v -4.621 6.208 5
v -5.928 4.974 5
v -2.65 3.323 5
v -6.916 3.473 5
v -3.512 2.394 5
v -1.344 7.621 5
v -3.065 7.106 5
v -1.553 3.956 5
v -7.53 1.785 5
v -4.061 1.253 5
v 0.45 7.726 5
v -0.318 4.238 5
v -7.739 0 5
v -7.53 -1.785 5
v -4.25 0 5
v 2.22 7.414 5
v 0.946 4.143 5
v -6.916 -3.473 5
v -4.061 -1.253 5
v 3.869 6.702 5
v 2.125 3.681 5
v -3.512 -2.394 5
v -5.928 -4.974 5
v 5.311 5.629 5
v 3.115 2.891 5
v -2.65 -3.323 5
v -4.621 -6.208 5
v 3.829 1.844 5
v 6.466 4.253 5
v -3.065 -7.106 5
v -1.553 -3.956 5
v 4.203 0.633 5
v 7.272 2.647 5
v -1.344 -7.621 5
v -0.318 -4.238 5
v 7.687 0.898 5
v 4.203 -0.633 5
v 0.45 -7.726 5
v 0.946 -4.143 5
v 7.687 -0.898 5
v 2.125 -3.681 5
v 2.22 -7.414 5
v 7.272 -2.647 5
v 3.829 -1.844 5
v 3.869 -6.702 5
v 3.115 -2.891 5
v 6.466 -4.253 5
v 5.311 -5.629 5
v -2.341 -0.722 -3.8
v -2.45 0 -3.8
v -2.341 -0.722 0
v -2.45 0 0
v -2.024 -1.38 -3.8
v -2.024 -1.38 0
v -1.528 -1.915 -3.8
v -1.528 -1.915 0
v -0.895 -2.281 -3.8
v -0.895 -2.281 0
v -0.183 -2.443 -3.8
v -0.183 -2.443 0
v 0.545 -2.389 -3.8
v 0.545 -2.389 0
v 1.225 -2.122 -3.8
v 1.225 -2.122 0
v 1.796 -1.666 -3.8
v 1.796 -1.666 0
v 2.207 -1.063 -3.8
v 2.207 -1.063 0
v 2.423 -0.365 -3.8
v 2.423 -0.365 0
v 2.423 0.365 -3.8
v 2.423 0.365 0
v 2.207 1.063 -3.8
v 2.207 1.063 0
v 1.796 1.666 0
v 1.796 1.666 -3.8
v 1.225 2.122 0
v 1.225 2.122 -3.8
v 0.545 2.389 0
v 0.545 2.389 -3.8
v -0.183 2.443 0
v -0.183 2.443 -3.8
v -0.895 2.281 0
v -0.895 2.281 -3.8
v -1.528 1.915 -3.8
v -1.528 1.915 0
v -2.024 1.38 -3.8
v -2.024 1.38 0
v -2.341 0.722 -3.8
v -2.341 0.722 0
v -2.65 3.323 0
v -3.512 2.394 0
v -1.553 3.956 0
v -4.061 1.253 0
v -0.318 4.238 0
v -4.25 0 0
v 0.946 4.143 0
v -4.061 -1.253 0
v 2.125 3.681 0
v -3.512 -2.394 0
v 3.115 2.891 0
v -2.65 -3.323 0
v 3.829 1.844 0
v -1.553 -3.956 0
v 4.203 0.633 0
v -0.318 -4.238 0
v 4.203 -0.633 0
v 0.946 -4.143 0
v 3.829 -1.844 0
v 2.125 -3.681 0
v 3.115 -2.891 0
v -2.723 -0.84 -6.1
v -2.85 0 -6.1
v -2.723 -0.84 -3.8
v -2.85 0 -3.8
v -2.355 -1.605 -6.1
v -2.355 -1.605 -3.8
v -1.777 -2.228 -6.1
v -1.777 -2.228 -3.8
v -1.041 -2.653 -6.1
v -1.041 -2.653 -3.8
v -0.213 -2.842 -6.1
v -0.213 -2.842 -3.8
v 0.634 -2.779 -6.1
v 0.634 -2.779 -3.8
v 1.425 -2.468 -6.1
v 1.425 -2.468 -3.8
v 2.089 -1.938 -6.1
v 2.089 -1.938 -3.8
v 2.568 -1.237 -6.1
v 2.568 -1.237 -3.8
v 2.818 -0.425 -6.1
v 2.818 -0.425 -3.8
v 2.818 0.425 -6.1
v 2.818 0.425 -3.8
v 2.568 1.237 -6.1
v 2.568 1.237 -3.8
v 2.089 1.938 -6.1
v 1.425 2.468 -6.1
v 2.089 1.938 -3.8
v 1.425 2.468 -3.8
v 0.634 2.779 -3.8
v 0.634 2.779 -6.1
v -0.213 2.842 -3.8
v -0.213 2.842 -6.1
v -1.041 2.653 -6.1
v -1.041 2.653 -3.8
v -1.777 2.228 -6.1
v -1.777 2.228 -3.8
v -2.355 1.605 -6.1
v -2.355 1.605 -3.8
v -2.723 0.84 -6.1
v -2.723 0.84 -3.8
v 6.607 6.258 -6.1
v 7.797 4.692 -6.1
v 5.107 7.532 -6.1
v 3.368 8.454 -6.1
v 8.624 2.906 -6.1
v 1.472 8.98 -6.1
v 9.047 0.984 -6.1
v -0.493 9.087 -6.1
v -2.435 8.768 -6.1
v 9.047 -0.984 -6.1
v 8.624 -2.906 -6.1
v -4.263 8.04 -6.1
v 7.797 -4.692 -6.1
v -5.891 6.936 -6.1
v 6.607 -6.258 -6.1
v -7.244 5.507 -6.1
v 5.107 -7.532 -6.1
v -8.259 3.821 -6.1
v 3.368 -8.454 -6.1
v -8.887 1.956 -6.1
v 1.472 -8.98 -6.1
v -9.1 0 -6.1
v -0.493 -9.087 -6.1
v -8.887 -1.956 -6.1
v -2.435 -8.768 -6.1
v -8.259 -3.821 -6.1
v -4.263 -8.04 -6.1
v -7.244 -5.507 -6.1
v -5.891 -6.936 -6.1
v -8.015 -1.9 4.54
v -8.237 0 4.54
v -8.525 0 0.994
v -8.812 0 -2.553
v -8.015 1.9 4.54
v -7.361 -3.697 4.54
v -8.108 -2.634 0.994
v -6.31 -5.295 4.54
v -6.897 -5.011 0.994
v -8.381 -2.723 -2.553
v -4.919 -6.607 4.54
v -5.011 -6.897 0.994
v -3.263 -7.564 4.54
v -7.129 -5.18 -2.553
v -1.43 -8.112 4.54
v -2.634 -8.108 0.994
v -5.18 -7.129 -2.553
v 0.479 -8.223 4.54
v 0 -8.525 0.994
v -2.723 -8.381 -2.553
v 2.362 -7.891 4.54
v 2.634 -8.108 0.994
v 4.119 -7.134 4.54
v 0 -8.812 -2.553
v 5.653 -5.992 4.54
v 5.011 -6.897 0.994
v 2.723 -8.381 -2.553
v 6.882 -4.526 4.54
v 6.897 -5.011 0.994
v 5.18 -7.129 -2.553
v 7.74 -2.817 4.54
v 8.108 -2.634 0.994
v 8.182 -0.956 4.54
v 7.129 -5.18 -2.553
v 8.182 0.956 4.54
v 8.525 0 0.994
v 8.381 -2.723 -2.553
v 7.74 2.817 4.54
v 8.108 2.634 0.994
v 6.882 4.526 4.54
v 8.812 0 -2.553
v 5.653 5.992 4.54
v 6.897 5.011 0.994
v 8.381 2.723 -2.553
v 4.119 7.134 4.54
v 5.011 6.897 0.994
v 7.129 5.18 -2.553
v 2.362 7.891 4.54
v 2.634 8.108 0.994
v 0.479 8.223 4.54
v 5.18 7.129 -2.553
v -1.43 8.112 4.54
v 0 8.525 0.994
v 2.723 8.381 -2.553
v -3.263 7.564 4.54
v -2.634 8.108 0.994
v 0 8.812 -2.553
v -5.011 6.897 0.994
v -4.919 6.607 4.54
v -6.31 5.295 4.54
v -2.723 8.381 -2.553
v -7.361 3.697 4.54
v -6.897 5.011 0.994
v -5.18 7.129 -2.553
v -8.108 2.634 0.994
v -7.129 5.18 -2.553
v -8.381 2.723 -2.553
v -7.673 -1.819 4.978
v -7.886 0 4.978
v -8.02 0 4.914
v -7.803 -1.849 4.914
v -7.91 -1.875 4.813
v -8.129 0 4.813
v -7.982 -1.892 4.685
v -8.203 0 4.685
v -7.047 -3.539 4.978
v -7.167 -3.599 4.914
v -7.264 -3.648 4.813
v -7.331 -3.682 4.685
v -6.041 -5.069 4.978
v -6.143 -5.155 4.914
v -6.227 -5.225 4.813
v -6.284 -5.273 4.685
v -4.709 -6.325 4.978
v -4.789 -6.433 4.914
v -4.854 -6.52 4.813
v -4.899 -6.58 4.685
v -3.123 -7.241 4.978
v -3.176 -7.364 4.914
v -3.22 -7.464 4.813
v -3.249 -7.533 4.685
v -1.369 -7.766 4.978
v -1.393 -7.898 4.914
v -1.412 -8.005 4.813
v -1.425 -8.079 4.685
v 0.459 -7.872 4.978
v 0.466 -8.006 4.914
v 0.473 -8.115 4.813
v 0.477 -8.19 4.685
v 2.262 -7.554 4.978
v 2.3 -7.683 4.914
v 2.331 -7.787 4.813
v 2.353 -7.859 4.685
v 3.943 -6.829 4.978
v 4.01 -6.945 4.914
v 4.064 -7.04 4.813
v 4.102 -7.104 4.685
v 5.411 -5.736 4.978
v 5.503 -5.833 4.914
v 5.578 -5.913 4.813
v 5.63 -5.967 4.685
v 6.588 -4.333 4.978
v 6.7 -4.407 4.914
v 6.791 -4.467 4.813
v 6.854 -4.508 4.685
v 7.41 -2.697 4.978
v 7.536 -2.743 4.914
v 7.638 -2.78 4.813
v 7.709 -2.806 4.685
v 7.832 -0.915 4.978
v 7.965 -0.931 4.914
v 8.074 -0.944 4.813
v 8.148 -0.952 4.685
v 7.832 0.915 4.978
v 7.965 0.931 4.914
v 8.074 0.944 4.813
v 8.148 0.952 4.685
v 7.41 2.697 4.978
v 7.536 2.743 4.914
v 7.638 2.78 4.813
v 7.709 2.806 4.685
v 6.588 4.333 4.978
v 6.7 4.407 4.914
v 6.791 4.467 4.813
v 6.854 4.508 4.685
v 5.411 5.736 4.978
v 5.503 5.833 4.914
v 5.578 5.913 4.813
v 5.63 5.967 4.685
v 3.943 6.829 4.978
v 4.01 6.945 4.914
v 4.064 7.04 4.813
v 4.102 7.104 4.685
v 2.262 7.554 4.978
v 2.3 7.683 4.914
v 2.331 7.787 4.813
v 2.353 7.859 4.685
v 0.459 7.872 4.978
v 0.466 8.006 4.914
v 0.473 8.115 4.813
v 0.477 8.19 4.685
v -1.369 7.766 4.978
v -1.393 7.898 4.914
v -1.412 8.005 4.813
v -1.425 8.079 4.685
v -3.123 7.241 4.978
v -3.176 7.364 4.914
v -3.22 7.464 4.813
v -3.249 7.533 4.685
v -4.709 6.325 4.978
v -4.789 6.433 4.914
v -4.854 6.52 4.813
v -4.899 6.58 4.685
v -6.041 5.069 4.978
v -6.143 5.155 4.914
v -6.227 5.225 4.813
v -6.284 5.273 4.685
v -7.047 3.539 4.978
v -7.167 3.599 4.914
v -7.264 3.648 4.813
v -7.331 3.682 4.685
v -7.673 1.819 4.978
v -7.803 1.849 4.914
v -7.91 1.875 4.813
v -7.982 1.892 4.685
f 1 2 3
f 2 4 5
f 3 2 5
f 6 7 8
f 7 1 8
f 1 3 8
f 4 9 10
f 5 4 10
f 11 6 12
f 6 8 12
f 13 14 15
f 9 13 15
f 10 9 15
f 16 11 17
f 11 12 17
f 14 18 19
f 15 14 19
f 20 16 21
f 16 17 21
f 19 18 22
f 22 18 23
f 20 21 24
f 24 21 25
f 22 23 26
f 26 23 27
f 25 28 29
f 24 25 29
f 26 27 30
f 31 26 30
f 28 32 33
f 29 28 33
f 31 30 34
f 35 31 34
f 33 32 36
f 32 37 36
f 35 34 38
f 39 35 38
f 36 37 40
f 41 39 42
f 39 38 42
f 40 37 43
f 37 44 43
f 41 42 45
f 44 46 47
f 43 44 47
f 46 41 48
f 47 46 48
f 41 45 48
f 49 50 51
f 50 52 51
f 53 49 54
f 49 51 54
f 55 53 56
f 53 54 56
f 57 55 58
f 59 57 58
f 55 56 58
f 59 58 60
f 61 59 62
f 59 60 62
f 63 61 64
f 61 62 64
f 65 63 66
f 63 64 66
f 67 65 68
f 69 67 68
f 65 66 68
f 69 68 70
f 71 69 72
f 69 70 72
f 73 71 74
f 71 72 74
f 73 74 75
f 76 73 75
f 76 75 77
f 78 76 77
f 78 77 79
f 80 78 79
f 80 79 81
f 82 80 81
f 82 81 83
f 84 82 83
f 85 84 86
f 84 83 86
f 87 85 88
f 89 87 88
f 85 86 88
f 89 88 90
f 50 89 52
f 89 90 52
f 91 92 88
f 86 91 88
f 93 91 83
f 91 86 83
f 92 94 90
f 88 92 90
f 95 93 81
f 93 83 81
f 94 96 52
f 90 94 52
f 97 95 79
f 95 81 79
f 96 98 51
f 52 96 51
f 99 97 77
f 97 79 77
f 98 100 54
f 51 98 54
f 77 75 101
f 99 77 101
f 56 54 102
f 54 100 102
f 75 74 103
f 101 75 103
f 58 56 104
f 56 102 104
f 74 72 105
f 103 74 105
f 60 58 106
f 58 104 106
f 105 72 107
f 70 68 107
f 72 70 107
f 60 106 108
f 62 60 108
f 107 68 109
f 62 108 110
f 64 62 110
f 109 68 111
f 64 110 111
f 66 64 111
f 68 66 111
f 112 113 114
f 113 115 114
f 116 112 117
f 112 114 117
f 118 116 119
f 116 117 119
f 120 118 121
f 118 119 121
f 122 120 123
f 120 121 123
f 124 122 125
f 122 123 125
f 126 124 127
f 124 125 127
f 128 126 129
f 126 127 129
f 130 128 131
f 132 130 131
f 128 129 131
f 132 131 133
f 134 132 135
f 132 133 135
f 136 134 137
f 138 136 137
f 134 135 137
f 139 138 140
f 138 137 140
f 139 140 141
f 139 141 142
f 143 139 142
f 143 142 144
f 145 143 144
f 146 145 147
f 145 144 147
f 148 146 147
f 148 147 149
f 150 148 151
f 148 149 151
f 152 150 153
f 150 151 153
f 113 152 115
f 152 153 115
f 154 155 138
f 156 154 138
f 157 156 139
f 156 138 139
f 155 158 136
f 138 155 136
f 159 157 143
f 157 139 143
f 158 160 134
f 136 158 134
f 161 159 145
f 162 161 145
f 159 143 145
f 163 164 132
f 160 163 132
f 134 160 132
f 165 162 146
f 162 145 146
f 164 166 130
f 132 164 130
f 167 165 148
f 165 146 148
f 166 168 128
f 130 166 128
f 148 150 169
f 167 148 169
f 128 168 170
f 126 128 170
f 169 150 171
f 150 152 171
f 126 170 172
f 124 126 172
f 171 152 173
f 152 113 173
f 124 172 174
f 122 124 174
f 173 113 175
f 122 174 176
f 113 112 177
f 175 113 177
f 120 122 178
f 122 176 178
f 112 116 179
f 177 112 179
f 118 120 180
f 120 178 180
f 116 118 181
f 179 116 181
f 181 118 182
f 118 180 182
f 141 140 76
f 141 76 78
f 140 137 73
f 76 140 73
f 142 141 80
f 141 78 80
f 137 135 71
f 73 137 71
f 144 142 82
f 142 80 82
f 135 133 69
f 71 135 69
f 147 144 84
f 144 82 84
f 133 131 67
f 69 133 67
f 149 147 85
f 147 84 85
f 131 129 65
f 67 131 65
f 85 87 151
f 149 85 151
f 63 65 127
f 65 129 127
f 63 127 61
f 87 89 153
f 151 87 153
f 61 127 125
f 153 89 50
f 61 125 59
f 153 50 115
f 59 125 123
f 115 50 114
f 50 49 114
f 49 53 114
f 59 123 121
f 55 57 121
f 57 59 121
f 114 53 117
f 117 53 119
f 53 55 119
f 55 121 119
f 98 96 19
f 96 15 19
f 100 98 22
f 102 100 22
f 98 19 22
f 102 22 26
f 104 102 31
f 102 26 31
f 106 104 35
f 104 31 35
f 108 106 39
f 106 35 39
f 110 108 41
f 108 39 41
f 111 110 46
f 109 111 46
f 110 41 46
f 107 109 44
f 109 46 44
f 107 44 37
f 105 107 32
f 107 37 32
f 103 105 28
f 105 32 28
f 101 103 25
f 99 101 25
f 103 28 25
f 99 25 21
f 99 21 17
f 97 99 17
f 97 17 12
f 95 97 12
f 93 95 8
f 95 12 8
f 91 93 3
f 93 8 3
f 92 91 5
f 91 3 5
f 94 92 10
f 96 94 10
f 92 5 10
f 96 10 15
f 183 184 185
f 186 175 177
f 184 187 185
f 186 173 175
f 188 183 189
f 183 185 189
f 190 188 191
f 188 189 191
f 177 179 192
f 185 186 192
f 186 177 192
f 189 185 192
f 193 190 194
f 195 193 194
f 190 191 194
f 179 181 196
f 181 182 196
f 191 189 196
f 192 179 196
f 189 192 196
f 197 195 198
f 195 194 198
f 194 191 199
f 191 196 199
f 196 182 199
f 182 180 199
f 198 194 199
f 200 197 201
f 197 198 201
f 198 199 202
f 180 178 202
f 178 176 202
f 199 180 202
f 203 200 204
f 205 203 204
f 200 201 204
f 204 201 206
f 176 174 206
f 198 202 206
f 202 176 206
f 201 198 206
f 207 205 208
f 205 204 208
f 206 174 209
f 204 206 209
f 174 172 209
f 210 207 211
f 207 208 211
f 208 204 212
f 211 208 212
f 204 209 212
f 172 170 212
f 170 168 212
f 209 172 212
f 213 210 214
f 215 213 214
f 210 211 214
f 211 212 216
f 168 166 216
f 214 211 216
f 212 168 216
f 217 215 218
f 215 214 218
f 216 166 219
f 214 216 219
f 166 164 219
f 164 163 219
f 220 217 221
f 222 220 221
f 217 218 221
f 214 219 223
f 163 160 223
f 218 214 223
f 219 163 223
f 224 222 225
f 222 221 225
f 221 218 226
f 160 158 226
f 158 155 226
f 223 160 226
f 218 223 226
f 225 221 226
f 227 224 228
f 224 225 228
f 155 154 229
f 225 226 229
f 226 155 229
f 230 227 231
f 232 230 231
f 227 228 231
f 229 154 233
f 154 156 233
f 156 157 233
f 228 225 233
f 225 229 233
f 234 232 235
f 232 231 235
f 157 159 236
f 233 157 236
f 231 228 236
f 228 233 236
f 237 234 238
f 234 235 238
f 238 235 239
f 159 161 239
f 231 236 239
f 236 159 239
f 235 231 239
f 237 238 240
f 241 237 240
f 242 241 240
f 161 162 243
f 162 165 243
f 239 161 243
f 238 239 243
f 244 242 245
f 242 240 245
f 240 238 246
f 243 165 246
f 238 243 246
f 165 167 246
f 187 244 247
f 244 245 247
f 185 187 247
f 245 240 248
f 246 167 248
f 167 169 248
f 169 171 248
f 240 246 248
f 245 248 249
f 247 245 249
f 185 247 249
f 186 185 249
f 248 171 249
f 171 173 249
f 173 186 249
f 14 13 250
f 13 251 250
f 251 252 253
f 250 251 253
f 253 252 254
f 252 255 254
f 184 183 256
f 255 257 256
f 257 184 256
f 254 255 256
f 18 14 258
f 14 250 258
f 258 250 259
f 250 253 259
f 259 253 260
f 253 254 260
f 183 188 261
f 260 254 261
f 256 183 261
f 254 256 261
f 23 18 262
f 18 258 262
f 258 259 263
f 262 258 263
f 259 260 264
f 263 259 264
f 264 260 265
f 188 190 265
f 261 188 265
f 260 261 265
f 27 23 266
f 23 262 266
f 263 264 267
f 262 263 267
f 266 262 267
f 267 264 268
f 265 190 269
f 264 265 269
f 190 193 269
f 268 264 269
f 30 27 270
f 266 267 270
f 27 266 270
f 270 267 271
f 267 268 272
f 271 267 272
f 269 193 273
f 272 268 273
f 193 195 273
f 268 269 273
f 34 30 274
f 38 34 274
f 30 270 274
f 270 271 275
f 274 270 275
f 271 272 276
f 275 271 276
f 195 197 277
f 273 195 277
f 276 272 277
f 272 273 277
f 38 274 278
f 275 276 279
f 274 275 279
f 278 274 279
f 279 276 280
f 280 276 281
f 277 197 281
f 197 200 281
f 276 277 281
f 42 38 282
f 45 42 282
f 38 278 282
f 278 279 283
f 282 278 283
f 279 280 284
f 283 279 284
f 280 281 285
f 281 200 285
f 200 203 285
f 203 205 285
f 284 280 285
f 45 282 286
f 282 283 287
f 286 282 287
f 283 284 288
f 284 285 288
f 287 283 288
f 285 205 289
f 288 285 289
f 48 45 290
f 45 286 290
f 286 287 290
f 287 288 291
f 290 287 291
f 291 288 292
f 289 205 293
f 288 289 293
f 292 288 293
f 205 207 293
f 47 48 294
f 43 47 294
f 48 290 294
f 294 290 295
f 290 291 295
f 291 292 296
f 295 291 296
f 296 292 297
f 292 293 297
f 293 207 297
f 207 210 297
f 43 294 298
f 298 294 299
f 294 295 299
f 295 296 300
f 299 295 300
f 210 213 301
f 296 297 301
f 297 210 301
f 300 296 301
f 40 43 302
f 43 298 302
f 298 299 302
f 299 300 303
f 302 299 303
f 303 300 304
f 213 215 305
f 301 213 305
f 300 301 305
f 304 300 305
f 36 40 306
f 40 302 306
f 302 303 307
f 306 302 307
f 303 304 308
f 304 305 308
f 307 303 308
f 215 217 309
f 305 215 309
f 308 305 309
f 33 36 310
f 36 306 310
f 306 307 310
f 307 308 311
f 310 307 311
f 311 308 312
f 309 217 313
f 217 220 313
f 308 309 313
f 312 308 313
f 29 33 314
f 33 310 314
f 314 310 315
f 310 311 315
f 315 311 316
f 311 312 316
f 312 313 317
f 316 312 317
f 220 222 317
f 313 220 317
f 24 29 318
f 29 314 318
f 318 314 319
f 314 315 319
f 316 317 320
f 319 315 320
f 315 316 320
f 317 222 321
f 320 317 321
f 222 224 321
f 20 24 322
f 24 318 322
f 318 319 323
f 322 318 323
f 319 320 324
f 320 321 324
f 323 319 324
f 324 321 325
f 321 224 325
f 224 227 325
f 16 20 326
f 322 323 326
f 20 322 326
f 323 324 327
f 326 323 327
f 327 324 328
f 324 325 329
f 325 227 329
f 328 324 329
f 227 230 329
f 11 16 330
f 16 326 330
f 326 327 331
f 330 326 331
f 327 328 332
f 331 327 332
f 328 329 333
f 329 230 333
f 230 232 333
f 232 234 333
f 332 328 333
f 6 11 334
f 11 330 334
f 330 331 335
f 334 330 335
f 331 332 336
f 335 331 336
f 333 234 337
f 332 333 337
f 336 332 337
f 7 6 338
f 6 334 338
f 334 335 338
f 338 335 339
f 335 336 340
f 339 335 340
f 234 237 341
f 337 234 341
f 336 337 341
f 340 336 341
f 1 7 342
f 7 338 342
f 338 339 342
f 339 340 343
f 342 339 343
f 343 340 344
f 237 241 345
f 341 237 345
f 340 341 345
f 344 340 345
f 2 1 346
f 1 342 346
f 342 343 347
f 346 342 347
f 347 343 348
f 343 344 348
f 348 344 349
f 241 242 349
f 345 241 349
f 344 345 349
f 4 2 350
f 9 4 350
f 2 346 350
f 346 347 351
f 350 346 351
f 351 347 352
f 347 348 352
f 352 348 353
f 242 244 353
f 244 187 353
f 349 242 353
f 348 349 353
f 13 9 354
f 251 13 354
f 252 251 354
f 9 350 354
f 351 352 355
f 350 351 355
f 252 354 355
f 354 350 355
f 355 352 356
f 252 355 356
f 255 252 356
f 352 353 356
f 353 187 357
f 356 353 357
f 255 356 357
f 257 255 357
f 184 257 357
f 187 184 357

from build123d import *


with BuildPart() as part:
    # Sketch1 → Revolve1 (revolve)
    with BuildSketch(Plane(origin=(0, 0, 0), x_dir=(0, 0, -1), z_dir=(1, 0, 0)), mode=Mode.PRIVATE) as revolve1_sk:
        with BuildLine():
            Line((0, 2.45), (0, 4.25))
            Line((0, 4.25), (-5, 4.25))
            Line((-5, 4.25), (-5, 7.738899697))
            ThreePointArc((-5, 7.738899697), (-4.867562217, 8.077865797), (-4.540407934, 8.237264222))
            Line((-4.540407934, 8.237264222), (6.1, 9.1))
            Line((6.1, 9.1), (6.1, 2.85))
            Line((6.1, 2.85), (3.8, 2.85))
            Line((3.8, 2.85), (3.8, 2.45))
            Line((3.8, 2.45), (0, 2.45))
        make_face()
    revolve(revolve1_sk.sketch.rotate(Axis((0, 0, 0), (0, 0, 1)), 90), axis=Axis((0, 0, 0), (0, 0, 1)))


solid = part.part
